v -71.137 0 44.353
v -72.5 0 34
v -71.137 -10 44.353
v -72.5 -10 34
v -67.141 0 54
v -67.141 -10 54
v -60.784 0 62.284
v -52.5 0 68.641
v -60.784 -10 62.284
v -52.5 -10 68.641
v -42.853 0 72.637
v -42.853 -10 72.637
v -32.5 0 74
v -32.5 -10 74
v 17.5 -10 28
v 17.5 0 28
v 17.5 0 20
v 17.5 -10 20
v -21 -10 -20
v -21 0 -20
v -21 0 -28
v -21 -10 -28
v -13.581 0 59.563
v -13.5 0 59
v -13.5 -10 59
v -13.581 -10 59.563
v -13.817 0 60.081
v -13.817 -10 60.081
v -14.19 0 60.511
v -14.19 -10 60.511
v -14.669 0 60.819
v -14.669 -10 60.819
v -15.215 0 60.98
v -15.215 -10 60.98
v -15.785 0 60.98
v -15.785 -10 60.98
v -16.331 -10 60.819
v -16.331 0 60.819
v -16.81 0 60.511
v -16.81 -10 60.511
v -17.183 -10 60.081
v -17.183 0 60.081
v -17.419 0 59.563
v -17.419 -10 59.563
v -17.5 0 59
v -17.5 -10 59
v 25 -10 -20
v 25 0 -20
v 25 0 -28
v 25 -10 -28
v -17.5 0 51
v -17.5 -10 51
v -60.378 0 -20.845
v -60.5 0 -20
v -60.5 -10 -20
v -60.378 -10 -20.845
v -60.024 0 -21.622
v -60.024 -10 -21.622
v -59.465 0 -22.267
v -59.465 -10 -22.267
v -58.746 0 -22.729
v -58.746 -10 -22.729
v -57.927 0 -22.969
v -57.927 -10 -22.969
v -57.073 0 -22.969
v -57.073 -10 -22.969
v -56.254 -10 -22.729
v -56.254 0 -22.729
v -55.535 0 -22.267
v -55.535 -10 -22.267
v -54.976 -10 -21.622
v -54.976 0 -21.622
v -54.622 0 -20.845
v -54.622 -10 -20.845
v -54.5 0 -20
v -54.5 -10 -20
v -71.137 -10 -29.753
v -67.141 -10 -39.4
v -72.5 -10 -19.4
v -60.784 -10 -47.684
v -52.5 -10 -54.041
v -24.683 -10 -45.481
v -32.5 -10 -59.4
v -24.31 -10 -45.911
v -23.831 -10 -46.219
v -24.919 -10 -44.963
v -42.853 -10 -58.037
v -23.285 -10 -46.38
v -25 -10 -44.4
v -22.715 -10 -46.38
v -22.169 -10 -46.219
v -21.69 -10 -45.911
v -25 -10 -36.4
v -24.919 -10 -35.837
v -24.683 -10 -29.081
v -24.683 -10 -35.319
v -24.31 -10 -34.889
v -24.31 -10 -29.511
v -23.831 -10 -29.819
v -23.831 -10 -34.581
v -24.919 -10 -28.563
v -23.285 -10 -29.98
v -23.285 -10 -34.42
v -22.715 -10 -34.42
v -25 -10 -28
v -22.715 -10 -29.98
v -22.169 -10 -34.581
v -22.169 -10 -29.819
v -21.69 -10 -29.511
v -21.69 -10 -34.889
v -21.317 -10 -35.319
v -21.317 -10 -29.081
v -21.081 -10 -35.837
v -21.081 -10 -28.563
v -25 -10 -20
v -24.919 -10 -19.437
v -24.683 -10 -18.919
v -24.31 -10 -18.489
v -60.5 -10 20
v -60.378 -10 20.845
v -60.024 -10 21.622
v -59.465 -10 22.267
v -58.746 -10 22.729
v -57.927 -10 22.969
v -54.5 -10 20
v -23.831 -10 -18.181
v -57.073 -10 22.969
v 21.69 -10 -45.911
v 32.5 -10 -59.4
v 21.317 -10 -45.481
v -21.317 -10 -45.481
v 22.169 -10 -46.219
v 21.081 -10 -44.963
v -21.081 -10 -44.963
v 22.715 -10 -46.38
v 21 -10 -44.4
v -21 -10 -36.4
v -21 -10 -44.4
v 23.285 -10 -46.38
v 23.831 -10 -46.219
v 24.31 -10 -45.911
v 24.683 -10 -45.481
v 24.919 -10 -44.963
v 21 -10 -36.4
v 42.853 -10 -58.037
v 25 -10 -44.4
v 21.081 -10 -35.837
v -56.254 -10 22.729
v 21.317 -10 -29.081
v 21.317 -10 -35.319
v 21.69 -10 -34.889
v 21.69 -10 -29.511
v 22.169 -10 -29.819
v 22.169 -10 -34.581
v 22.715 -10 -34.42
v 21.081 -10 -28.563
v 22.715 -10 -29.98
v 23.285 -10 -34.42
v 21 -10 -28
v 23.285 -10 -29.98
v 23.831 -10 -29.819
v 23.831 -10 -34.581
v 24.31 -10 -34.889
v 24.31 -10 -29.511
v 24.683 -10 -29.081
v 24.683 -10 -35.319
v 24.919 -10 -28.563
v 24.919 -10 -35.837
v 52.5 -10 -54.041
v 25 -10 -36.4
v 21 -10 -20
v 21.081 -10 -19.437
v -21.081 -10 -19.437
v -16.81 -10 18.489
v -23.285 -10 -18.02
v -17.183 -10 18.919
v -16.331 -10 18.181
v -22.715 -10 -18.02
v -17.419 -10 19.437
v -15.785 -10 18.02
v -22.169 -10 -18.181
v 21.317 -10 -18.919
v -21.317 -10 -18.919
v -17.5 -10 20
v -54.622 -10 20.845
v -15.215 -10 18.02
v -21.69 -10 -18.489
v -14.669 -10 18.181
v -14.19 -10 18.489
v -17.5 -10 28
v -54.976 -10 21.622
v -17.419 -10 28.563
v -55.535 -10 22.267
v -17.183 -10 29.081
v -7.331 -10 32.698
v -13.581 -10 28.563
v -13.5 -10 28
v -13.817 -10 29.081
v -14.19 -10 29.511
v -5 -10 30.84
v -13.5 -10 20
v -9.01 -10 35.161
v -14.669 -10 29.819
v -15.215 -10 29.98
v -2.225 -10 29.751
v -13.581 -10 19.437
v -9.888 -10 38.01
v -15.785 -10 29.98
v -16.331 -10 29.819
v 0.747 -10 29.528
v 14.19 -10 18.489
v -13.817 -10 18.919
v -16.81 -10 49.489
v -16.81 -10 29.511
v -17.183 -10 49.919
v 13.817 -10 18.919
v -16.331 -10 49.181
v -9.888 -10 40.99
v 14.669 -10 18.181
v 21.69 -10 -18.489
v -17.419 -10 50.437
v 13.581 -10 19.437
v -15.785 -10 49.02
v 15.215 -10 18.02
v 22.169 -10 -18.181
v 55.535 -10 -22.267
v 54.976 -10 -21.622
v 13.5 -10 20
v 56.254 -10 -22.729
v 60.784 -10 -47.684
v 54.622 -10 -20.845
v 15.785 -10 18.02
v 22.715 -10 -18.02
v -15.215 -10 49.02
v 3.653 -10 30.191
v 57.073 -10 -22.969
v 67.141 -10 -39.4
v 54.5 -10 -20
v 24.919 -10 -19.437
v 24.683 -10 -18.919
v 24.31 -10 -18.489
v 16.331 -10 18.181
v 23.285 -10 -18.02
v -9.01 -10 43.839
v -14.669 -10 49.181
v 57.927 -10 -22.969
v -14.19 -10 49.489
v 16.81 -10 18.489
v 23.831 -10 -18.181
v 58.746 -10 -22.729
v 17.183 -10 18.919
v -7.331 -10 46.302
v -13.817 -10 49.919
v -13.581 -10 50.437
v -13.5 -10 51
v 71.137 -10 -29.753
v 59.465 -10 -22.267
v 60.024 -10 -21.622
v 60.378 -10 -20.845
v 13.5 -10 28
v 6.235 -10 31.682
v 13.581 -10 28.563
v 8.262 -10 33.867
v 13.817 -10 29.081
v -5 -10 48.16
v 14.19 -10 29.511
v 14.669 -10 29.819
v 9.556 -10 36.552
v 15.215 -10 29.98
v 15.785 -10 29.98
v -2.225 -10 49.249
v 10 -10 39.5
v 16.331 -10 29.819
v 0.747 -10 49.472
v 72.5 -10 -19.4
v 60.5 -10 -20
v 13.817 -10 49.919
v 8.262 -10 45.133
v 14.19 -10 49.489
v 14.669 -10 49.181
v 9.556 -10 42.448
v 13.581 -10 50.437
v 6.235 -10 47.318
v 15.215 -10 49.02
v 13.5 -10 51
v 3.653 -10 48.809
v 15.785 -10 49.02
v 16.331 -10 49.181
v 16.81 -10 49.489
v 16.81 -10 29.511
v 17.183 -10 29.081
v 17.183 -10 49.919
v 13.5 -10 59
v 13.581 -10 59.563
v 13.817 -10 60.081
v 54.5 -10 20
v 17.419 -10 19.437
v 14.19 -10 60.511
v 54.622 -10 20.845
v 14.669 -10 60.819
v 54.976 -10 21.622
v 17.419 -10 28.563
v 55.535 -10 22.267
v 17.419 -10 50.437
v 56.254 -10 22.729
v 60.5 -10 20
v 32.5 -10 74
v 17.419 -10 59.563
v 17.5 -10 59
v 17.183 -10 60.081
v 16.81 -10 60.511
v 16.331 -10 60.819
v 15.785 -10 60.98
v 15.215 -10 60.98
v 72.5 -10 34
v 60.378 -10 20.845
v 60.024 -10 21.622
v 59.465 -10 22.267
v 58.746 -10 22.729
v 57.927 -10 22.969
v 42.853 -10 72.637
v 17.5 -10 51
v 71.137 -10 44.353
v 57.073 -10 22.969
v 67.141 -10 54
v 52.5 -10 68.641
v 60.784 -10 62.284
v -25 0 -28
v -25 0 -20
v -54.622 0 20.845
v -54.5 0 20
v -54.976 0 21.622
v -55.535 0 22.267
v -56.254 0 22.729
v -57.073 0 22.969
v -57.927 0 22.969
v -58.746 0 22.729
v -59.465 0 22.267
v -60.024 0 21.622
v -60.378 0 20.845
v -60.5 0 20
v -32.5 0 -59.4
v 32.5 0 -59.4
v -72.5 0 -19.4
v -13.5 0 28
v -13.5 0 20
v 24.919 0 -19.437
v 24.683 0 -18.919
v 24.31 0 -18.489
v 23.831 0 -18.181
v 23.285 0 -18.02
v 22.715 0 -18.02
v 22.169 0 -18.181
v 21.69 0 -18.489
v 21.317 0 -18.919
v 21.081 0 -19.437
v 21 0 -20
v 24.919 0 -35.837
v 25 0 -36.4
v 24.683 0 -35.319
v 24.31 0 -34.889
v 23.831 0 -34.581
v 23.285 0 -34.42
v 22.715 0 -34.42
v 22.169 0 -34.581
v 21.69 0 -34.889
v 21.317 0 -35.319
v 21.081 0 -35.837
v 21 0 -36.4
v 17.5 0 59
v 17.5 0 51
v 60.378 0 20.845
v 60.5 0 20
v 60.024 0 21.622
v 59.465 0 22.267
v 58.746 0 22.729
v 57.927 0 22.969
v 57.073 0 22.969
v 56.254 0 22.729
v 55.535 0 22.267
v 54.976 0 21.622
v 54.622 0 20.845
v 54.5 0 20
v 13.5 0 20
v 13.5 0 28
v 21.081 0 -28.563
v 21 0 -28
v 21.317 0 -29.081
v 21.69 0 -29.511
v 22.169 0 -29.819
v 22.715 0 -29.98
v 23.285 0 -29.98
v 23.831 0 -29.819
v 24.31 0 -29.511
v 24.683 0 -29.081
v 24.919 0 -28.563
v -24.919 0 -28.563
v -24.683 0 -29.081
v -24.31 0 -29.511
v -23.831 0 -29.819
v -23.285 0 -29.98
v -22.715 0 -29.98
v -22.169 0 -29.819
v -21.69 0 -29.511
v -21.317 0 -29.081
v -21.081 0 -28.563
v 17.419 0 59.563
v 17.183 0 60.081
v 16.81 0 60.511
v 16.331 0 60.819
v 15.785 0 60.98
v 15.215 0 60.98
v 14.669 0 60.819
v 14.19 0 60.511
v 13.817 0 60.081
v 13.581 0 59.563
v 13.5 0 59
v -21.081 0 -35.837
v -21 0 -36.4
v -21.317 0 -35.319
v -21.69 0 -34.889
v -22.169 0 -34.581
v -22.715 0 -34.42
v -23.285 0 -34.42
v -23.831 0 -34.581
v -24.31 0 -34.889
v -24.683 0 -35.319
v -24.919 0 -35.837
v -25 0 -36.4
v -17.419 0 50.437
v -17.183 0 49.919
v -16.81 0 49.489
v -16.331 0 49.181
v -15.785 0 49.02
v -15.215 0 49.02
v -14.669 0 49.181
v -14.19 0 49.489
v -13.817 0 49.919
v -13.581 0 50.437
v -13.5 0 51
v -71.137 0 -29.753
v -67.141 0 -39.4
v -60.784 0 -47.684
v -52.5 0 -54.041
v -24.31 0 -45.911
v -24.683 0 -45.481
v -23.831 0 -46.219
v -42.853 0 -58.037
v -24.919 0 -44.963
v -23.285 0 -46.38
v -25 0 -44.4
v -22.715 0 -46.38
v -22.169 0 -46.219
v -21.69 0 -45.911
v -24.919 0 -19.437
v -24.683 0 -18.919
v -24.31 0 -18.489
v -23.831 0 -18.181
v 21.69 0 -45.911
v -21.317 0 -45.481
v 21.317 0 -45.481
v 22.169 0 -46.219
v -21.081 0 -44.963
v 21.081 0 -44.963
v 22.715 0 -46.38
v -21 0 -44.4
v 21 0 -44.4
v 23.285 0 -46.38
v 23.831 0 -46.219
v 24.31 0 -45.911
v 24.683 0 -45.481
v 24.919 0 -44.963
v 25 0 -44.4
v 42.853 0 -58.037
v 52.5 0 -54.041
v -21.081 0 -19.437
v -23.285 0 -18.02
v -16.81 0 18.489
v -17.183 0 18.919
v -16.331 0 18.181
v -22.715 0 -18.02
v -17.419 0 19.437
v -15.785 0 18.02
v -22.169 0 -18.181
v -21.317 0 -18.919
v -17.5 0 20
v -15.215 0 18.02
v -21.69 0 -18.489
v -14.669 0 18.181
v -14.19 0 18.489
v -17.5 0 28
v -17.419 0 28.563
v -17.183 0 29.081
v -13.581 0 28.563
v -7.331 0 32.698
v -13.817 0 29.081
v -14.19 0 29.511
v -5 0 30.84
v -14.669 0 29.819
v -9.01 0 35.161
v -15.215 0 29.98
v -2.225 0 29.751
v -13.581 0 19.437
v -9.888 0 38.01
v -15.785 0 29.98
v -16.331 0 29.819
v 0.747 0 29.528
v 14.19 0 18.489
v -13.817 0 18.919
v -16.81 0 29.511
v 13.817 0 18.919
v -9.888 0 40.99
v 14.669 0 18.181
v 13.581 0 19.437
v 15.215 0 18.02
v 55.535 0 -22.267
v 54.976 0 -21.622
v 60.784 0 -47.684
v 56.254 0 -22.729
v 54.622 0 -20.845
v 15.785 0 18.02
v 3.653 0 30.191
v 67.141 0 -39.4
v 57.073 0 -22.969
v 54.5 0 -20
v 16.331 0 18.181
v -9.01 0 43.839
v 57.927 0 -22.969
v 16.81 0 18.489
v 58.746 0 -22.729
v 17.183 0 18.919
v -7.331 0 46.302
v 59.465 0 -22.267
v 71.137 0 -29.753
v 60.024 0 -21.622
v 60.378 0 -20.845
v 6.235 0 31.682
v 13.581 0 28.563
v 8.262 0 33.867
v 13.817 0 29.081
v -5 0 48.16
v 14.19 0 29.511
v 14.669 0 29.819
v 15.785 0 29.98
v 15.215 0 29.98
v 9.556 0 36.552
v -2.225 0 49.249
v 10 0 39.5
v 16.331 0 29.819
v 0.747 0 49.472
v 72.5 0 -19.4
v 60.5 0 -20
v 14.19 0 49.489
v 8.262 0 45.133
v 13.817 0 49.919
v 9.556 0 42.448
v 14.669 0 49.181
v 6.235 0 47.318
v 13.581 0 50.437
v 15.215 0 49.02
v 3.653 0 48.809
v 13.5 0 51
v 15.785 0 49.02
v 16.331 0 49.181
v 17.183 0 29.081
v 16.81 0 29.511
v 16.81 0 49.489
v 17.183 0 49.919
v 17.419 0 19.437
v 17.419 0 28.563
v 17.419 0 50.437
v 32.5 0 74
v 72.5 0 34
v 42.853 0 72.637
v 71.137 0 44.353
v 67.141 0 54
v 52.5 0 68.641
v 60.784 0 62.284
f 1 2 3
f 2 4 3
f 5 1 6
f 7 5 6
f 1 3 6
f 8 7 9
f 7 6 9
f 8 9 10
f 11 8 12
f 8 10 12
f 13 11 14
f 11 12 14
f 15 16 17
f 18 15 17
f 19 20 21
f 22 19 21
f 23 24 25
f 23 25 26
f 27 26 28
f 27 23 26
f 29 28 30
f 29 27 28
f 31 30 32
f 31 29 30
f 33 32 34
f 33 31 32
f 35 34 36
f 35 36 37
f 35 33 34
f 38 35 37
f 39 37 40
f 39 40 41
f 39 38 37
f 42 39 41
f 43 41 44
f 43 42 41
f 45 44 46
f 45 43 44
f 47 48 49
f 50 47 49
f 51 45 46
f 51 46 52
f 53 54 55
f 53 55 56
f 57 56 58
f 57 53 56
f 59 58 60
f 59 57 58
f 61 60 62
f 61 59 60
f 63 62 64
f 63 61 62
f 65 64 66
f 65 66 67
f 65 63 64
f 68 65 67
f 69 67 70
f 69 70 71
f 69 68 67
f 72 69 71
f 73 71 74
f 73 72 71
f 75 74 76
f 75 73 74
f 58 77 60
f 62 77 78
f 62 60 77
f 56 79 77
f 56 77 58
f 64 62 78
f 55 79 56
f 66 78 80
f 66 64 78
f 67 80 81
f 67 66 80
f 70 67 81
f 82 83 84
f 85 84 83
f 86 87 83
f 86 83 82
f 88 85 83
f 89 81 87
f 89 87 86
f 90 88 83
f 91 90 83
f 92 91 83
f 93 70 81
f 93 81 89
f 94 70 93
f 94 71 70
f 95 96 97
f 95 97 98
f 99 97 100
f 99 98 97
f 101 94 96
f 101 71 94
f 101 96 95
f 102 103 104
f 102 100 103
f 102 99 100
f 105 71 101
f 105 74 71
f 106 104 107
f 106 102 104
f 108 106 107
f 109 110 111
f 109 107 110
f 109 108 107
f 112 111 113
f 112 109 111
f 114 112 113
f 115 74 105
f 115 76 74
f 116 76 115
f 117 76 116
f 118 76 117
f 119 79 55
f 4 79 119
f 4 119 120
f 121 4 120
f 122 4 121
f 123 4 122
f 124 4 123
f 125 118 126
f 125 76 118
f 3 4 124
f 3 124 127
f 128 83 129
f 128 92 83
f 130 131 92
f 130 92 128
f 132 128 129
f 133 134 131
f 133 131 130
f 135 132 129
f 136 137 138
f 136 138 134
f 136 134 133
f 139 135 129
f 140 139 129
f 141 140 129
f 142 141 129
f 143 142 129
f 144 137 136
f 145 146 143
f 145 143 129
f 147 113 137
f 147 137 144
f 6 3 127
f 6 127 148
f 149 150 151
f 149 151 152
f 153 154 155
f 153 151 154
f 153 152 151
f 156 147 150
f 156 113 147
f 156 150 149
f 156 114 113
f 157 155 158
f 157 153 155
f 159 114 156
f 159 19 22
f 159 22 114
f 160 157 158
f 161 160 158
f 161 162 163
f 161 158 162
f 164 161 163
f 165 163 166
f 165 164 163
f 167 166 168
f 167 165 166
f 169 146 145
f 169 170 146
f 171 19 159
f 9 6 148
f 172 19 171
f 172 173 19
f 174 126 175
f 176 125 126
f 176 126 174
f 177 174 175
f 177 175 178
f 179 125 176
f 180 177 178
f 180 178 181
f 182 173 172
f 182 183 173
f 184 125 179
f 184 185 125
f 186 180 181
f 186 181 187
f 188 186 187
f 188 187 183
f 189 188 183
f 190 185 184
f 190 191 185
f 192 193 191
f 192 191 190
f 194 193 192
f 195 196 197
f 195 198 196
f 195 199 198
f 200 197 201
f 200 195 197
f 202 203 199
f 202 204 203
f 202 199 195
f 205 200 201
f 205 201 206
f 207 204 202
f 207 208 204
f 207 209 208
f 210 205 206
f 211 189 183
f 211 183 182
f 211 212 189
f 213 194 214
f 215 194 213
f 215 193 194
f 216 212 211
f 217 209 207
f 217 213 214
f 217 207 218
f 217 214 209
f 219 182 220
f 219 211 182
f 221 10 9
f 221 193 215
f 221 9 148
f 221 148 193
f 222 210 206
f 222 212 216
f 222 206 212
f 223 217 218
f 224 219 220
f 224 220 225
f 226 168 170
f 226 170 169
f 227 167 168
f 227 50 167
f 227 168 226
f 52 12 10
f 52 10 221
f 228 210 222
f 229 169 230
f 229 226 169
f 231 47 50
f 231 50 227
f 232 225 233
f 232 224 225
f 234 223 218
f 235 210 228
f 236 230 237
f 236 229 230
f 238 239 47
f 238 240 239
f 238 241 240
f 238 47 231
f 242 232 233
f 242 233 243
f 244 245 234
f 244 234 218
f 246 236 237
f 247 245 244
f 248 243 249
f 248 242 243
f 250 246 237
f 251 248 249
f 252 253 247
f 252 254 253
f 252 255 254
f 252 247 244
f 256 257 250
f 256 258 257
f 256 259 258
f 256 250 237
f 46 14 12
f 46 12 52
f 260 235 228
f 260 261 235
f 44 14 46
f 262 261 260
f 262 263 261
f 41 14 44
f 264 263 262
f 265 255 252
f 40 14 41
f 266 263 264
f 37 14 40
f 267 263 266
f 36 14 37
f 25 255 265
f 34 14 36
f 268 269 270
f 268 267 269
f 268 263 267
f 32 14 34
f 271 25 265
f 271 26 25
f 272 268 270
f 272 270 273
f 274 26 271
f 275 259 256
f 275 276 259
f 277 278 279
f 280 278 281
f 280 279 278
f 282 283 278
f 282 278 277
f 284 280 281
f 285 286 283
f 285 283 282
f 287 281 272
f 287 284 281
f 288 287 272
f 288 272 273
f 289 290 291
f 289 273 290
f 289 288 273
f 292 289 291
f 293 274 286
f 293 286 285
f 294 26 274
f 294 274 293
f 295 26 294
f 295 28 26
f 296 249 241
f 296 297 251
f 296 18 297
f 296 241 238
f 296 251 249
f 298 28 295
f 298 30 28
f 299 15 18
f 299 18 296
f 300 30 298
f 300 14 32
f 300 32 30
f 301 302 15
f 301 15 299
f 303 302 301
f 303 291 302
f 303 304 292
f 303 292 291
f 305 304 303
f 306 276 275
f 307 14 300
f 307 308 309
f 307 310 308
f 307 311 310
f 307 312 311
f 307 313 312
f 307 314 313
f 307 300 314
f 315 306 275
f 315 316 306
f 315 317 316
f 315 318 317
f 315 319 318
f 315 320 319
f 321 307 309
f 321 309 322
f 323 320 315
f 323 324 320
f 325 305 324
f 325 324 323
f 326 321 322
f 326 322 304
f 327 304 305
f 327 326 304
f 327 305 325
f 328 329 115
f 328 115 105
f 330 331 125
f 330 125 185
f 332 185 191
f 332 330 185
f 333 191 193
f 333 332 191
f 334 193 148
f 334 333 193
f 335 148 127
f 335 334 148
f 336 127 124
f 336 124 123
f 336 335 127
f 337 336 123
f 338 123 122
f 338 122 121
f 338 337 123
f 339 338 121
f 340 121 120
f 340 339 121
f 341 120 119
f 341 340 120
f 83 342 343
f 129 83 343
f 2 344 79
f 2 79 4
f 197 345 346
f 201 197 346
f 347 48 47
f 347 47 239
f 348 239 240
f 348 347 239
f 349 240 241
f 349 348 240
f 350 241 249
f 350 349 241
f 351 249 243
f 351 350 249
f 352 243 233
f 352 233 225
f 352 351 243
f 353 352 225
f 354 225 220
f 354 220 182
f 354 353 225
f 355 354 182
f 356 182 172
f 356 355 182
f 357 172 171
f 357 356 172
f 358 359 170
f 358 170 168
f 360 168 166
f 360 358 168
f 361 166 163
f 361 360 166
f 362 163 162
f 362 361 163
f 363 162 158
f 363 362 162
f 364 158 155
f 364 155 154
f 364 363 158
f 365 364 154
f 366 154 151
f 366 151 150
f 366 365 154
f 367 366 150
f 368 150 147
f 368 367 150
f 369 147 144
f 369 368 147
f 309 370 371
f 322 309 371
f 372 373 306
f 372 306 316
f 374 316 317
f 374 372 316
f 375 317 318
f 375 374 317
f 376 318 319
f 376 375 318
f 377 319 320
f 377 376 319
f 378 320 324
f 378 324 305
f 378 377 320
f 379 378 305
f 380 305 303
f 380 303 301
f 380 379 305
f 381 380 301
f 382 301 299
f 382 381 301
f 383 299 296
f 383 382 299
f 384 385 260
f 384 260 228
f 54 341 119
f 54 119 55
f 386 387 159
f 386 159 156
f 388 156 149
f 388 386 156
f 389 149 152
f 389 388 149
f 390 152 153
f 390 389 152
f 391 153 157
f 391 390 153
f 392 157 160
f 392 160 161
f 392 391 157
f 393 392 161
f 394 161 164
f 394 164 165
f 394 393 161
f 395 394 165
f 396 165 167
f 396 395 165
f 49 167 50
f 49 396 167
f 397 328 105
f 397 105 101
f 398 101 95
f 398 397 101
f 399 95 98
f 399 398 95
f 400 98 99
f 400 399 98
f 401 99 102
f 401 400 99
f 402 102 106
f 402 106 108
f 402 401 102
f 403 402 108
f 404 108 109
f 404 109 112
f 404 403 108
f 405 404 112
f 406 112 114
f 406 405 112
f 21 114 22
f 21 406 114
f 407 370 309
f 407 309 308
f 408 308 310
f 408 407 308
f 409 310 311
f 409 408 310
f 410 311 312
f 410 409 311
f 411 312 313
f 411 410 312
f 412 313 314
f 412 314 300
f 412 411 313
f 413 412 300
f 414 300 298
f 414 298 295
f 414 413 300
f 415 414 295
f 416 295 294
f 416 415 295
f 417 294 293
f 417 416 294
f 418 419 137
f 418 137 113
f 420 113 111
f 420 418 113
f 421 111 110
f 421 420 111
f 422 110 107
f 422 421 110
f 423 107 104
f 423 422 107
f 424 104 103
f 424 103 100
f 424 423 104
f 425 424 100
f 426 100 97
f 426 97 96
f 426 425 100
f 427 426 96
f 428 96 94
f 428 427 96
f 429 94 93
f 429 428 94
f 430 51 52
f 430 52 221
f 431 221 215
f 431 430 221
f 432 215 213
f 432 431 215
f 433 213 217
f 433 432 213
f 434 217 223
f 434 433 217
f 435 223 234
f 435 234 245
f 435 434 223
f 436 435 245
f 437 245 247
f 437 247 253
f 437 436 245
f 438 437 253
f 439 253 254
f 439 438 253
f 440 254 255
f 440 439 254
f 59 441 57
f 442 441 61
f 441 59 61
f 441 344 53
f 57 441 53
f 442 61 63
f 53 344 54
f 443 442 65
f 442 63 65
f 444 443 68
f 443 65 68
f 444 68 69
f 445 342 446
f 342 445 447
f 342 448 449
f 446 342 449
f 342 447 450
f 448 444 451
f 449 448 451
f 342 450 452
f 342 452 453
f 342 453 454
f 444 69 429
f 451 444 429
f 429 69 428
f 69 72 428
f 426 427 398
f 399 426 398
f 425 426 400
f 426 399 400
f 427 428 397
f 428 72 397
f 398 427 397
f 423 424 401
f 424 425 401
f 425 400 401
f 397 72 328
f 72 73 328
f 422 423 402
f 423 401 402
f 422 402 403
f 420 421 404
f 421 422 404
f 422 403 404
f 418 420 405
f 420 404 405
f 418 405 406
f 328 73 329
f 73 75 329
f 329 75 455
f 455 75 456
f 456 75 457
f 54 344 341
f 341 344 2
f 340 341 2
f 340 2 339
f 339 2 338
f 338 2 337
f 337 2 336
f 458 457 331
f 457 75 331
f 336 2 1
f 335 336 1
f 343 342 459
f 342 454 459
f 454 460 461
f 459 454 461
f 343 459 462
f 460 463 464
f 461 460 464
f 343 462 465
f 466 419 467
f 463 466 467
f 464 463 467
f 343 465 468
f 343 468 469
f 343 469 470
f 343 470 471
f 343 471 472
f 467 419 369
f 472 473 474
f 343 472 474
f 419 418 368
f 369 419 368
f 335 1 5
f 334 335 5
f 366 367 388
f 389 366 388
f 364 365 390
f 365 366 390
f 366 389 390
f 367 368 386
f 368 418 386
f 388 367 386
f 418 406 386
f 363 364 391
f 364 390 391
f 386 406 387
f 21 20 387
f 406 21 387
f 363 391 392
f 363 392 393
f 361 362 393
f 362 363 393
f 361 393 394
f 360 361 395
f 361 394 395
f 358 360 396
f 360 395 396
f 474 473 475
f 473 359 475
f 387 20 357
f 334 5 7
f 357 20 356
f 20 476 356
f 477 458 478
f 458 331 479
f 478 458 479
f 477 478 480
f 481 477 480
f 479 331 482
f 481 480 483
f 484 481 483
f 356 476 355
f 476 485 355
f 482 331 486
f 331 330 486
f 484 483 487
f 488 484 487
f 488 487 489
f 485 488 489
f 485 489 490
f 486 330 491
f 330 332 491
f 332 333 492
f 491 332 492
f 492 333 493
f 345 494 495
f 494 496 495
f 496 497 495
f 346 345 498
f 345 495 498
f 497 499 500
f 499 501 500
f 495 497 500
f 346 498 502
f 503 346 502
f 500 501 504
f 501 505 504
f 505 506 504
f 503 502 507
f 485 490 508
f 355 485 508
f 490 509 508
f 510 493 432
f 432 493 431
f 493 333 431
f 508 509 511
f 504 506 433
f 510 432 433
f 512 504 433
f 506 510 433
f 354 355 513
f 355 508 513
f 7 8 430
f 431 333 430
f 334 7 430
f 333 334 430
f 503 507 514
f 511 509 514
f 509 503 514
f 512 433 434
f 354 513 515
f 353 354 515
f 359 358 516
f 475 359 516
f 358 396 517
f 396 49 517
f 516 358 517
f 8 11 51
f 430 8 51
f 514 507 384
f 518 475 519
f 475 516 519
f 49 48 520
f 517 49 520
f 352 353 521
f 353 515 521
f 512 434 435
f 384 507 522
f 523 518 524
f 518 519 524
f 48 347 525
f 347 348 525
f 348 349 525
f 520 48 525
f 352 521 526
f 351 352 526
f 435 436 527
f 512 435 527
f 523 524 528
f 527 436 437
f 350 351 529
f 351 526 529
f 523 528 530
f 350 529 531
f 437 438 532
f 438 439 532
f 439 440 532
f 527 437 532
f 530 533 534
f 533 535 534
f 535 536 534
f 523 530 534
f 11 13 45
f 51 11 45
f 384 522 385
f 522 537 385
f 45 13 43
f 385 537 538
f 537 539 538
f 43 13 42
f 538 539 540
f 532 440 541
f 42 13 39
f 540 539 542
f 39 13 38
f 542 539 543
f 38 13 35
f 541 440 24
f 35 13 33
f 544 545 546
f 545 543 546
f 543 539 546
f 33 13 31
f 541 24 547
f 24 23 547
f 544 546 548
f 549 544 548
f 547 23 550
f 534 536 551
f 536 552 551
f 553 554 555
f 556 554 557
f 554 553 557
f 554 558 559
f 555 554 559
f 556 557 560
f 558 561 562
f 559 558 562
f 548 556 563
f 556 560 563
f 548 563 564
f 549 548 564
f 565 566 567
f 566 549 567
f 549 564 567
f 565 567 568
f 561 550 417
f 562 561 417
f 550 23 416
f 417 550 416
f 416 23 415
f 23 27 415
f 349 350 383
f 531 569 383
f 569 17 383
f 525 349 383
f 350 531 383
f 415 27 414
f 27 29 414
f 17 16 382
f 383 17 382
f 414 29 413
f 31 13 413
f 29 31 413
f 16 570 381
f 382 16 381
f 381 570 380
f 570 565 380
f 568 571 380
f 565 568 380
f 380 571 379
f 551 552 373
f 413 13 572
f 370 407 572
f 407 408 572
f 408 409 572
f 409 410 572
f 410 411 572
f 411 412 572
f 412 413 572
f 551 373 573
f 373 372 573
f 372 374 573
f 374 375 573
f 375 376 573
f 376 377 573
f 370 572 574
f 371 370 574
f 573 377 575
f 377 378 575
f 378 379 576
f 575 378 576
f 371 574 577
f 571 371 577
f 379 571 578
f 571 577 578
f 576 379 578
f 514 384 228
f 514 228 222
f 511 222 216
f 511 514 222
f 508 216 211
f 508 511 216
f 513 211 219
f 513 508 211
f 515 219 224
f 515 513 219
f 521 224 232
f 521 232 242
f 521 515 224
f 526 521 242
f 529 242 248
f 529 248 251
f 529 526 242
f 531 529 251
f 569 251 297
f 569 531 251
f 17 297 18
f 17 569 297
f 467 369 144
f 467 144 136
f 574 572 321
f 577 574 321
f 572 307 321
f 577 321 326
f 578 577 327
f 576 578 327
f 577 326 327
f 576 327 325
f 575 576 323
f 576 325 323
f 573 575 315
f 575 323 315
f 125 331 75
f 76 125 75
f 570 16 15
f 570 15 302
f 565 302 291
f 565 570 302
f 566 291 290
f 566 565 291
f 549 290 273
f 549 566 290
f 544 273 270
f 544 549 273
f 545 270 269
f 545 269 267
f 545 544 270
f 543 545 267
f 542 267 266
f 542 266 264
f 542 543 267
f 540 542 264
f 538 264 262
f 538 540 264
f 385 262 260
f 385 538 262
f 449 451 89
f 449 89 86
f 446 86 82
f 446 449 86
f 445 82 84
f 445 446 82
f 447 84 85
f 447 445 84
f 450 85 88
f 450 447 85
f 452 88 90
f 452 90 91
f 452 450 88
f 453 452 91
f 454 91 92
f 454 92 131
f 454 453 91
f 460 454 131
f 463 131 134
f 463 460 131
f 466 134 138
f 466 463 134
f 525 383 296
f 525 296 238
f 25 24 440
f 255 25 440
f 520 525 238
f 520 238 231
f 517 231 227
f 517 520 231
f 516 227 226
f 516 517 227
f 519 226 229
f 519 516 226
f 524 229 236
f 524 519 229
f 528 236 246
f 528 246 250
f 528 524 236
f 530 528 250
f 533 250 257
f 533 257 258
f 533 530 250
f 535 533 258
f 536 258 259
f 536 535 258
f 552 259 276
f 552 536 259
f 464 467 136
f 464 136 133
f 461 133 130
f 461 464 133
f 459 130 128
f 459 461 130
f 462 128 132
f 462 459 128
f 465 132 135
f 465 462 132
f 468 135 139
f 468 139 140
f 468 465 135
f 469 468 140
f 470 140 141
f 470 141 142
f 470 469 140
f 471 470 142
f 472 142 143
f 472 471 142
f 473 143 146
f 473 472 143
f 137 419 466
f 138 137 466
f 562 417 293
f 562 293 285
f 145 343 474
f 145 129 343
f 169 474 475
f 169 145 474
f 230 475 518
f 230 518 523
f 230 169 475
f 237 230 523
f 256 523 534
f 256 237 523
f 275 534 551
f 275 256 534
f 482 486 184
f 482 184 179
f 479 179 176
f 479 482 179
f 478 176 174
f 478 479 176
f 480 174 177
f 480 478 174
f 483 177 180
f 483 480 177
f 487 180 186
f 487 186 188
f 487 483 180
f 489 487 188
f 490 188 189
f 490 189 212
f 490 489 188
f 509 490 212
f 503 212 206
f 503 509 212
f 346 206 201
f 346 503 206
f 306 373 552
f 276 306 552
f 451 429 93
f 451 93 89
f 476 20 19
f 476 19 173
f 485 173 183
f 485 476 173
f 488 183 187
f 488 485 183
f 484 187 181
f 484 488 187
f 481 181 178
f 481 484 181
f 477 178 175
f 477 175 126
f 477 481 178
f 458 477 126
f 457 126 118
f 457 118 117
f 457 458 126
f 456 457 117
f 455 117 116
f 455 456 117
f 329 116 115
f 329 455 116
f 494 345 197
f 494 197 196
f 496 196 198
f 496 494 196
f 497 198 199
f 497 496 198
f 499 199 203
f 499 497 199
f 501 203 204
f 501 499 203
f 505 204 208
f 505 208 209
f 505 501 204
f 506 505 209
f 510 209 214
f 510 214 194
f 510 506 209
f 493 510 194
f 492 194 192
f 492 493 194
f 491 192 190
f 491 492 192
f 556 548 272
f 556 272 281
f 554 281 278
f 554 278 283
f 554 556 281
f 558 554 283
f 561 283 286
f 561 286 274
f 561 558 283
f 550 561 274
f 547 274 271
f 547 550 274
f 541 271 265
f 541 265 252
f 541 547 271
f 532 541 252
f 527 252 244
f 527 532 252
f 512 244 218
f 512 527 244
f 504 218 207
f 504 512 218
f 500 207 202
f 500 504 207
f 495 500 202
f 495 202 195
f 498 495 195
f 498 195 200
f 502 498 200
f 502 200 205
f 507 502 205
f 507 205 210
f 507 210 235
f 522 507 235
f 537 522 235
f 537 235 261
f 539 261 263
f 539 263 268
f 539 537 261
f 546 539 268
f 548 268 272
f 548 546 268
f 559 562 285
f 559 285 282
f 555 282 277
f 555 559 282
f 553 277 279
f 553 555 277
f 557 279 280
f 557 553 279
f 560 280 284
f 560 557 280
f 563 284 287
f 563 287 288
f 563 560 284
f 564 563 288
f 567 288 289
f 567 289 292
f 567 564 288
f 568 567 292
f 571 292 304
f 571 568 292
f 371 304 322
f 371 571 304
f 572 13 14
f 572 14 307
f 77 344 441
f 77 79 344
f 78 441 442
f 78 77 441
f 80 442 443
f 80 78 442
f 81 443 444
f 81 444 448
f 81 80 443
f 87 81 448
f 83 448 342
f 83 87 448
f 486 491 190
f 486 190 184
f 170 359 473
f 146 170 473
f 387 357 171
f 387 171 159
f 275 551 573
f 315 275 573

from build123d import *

# Parameters (mm, degrees)
SKETCH_W  = 145
SKETCH_H  = 133.4
SKETCH_R  = 10
PAD_DEPTH = 10
FILLET_R  = 40


with BuildPart() as part:
    # Sketch → Pad (new body)
    with BuildSketch(Plane.XZ):
        with Locations((0, 7.3)):
            Rectangle(SKETCH_W, SKETCH_H)
        with Locations((0, 39.5)):
            Circle(SKETCH_R, mode=Mode.SUBTRACT)
        with BuildLine():
            ThreePointArc((-13.5, 59), (-15.5, 61), (-17.5, 59))
            Line((-17.5, 59), (-17.5, 51))
            ThreePointArc((-17.5, 51), (-15.5, 49), (-13.5, 51))
            Line((-13.5, 59), (-13.5, 51))
        make_face(mode=Mode.SUBTRACT)
        with BuildLine():
            ThreePointArc((17.5, 59), (15.5, 61), (13.5, 59))
            Line((13.5, 59), (13.5, 51))
            ThreePointArc((13.5, 51), (15.5, 49), (17.5, 51))
            Line((17.5, 59), (17.5, 51))
        make_face(mode=Mode.SUBTRACT)
        with BuildLine():
            ThreePointArc((-13.5, 28), (-15.5, 30), (-17.5, 28))
            Line((-17.5, 28), (-17.5, 20))
            ThreePointArc((-17.5, 20), (-15.5, 18), (-13.5, 20))
            Line((-13.5, 28), (-13.5, 20))
        make_face(mode=Mode.SUBTRACT)
        with BuildLine():
            ThreePointArc((17.5, 28), (15.5, 30), (13.5, 28))
            Line((13.5, 28), (13.5, 20))
            ThreePointArc((13.5, 20), (15.5, 18), (17.5, 20))
            Line((17.5, 28), (17.5, 20))
        make_face(mode=Mode.SUBTRACT)
        with BuildLine():
            ThreePointArc((-21, -20), (-23, -18), (-25, -20))
            Line((-25, -20), (-25, -28))
            ThreePointArc((-25, -28), (-23, -30), (-21, -28))
            Line((-21, -20), (-21, -28))
        make_face(mode=Mode.SUBTRACT)
        with BuildLine():
            ThreePointArc((25, -20), (23, -18), (21, -20))
            Line((21, -20), (21, -28))
            ThreePointArc((21, -28), (23, -30), (25, -28))
            Line((25, -20), (25, -28))
        make_face(mode=Mode.SUBTRACT)
        with BuildLine():
            ThreePointArc((-21, -36.4), (-23, -34.4), (-25, -36.4))
            Line((-25, -36.4), (-25, -44.4))
            ThreePointArc((-25, -44.4), (-23, -46.4), (-21, -44.4))
            Line((-21, -36.4), (-21, -44.4))
        make_face(mode=Mode.SUBTRACT)
        with BuildLine():
            ThreePointArc((25, -36.4), (23, -34.4), (21, -36.4))
            Line((21, -36.4), (21, -44.4))
            ThreePointArc((21, -44.4), (23, -46.4), (25, -44.4))
            Line((25, -36.4), (25, -44.4))
        make_face(mode=Mode.SUBTRACT)
        with BuildLine():
            ThreePointArc((-54.5, 20), (-57.5, 23), (-60.5, 20))
            Line((-60.5, 20), (-60.5, -20))
            ThreePointArc((-60.5, -20), (-57.5, -23), (-54.5, -20))
            Line((-54.5, 20), (-54.5, -20))
        make_face(mode=Mode.SUBTRACT)
        with BuildLine():
            ThreePointArc((60.5, 20), (57.5, 23), (54.5, 20))
            Line((54.5, 20), (54.5, -20))
            ThreePointArc((54.5, -20), (57.5, -23), (60.5, -20))
            Line((60.5, 20), (60.5, -20))
        make_face(mode=Mode.SUBTRACT)
    extrude(amount=PAD_DEPTH)

    # Fillet
    fillet_edges = [part.edges().sort_by_distance(p)[0] for p in [
        (-72.5, -5, 74),
        (72.5, -5, 74),
        (72.5, -5, -59.4),
        (-72.5, -5, -59.4),
    ]]
    fillet(fillet_edges, radius=FILLET_R)


solid = part.part
